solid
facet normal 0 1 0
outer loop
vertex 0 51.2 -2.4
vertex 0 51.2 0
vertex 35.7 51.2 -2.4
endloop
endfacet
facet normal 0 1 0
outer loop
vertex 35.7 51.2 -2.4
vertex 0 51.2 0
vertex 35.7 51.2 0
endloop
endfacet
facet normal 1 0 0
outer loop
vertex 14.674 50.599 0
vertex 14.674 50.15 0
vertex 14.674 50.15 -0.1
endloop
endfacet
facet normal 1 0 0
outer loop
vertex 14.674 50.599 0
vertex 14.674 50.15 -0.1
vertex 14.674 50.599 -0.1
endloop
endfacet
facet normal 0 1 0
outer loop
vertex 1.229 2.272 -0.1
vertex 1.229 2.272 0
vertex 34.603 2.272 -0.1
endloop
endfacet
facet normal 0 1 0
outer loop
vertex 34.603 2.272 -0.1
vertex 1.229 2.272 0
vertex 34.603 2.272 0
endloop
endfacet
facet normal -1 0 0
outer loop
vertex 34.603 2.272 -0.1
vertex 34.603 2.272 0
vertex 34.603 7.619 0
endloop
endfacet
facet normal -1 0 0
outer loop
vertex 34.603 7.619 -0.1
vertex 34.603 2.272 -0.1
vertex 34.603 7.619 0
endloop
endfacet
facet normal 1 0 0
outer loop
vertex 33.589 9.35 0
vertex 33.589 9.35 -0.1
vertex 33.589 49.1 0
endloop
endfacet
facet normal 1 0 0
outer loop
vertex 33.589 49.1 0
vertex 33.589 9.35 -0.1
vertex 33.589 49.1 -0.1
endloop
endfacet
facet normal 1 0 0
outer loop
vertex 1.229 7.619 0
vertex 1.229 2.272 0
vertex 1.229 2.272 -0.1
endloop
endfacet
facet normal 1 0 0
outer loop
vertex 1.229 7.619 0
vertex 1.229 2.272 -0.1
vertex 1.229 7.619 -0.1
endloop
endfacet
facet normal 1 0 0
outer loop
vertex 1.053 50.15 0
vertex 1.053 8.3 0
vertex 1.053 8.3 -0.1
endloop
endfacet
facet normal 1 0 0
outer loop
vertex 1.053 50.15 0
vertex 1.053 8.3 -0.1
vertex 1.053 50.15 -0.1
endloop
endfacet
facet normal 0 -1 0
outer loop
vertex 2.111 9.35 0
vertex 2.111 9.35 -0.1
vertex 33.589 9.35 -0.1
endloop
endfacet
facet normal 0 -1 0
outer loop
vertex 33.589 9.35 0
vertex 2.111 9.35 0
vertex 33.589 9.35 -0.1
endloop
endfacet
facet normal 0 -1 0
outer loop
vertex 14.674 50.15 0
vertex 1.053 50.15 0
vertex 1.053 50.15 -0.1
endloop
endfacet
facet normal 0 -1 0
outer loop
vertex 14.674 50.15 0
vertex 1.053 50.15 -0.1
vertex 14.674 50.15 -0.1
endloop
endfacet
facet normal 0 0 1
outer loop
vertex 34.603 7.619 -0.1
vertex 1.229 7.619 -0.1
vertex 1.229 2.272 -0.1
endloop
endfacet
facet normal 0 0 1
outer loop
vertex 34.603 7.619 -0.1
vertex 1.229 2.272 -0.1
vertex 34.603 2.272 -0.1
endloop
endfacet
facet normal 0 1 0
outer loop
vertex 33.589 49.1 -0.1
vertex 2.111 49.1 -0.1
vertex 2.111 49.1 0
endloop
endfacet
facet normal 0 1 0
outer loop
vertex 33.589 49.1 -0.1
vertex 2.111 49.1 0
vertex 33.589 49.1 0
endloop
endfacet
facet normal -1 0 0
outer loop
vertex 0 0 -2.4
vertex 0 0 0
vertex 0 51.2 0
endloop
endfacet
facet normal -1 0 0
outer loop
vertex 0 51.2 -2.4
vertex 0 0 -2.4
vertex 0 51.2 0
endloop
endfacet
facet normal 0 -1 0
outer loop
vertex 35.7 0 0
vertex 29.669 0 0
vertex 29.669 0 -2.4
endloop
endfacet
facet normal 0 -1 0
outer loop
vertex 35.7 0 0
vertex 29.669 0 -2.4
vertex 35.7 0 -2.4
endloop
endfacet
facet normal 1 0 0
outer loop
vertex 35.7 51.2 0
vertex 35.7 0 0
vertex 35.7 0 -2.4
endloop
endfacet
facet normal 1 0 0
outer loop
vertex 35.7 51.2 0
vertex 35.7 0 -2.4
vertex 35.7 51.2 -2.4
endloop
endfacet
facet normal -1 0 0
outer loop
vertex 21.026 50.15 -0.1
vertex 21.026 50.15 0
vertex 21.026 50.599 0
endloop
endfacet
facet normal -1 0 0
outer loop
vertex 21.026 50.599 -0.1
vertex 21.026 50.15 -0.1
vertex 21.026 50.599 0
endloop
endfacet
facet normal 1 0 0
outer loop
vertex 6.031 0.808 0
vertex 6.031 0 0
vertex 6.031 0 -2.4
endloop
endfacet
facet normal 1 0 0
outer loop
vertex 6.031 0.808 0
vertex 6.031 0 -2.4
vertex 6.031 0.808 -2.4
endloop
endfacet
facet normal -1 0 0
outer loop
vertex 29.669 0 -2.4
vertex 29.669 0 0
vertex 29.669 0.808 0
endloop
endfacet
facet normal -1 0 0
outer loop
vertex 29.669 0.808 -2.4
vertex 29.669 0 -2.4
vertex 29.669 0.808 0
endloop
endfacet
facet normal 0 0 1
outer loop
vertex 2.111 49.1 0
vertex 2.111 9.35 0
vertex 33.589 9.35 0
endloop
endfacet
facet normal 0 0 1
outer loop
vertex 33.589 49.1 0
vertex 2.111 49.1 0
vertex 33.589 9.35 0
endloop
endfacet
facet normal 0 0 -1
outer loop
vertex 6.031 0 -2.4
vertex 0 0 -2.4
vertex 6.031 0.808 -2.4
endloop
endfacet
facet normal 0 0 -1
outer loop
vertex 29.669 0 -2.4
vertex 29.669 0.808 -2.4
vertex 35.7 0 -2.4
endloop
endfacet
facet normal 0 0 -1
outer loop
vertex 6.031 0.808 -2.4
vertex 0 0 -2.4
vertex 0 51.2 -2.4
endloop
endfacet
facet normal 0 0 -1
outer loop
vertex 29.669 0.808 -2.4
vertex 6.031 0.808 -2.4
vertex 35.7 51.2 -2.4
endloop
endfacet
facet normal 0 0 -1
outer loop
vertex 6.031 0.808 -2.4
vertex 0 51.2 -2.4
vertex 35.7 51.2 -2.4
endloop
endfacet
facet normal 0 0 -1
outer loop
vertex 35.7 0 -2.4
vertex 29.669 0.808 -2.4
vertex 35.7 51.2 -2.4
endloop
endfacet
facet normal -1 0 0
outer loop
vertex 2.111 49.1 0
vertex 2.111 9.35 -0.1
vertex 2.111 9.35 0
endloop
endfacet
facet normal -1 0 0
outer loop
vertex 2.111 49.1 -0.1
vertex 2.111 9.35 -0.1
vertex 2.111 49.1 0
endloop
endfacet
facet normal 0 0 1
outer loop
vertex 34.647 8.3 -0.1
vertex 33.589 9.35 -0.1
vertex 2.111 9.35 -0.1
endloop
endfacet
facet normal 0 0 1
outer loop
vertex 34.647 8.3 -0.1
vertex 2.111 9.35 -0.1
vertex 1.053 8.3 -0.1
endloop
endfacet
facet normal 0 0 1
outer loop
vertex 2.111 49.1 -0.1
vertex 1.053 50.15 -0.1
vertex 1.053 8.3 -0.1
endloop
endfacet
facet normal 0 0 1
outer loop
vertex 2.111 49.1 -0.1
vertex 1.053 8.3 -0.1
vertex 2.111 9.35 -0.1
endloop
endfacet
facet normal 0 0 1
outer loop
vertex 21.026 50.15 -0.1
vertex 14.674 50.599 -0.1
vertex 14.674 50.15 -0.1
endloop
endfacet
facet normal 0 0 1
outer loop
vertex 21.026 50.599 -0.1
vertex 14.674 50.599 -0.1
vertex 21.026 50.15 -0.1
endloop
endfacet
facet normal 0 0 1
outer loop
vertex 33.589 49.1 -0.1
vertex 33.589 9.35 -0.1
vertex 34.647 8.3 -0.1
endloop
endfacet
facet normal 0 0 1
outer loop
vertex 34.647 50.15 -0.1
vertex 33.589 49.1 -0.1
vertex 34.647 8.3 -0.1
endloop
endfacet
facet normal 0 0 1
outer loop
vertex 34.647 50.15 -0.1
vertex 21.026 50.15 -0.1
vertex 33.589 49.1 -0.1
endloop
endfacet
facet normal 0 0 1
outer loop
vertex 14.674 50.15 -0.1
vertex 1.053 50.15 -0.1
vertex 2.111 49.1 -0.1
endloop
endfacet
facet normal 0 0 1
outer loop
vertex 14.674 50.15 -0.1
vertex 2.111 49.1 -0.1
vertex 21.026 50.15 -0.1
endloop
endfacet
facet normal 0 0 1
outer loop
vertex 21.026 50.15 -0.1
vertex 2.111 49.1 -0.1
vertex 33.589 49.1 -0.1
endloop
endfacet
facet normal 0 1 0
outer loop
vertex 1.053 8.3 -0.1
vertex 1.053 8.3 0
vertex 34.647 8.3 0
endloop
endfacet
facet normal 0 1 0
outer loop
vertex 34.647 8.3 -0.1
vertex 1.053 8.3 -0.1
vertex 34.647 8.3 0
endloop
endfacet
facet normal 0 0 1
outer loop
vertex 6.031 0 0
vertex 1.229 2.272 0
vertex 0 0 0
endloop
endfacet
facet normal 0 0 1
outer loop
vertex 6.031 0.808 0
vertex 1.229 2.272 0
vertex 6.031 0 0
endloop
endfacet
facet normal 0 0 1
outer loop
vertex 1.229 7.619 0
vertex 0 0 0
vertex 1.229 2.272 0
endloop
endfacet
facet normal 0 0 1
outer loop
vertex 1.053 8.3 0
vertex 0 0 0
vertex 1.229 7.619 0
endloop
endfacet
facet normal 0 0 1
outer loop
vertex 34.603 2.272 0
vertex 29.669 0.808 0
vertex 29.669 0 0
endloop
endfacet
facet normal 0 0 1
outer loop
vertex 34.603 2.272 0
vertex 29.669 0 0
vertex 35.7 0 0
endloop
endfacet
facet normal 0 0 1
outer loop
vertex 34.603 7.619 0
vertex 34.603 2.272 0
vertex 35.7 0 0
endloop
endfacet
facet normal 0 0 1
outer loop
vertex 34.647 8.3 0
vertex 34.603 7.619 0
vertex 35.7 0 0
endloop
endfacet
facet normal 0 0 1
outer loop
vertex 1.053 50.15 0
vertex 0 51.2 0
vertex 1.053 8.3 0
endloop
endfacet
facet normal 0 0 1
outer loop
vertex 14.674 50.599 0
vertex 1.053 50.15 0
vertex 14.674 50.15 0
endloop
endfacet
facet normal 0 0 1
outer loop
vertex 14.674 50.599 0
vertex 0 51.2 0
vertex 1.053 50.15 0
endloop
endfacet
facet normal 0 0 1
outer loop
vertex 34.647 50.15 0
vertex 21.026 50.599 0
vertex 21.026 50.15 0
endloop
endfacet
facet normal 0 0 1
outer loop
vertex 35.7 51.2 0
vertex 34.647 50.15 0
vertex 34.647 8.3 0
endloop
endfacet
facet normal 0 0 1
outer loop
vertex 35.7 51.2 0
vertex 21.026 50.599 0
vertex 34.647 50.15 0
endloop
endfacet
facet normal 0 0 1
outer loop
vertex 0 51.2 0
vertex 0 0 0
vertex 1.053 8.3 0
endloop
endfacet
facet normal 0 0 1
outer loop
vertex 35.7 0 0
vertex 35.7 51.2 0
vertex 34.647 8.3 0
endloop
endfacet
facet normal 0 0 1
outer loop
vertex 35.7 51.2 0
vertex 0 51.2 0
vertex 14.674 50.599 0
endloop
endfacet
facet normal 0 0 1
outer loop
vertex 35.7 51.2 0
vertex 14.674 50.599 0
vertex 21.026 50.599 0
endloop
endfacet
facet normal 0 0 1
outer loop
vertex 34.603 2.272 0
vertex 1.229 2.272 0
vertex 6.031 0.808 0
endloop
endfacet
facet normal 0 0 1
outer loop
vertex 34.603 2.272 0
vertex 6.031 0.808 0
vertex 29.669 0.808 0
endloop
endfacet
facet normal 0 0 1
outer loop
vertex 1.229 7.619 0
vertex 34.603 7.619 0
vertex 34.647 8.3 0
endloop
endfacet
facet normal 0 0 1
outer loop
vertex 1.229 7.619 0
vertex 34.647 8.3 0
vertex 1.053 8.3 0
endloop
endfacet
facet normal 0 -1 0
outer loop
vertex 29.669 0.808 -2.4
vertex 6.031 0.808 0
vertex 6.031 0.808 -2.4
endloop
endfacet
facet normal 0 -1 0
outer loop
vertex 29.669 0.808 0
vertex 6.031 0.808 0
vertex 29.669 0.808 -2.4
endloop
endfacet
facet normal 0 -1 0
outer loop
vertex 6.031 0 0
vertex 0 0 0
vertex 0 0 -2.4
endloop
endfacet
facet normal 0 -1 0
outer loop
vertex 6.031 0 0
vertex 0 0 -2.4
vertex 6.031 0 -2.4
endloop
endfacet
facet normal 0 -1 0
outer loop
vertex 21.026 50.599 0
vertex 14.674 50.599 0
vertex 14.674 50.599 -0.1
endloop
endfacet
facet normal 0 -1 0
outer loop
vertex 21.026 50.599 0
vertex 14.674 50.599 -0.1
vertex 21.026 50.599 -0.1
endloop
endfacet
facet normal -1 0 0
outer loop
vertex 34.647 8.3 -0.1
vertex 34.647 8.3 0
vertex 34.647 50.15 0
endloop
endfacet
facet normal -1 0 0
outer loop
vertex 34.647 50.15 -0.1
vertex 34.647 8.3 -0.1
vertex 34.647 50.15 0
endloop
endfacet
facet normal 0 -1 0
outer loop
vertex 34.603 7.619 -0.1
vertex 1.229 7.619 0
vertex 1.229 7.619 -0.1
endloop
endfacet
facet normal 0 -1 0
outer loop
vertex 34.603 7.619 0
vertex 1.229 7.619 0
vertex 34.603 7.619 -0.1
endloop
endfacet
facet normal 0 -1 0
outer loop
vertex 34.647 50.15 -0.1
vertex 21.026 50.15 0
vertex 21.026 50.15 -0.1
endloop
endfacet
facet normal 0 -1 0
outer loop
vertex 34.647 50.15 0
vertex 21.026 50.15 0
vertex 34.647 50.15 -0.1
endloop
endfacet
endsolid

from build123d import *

# Parameters (mm, degrees)
ESQUISSE6_W             = 35.7
ESQUISSE6_H             = 51.2
BOSS_EXTRU_3_DEPTH      = 2.4
ESQUISSE7_W             = 33.59337029
ESQUISSE7_H             = 41.85
ENL_V_MAT_EXTRU_4_DEPTH = 0.1
ESQUISSE8_W             = 6.352818378
ESQUISSE8_H             = 0.449413723
ENL_V_MAT_EXTRU_5_DEPTH = 0.1
ESQUISSE9_W             = 31.478034176
ESQUISSE9_H             = 39.75
BOSS_EXTRU_4_DEPTH      = 0.1
ESQUISSE10_W            = 33.373849312
ESQUISSE10_H            = 5.346626879
ENL_V_MAT_EXTRU_6_DEPTH = 0.1
ESQUISSE11_W            = 23.638967436
ESQUISSE11_H            = 0.807997654
ENL_V_MAT_EXTRU_7_DEPTH = 63.463509347


with BuildPart() as part:
    # Esquisse6 → Boss.-Extru.3 (new body)
    with BuildSketch(Plane.XY):
        with Locations((17.85, 25.6)):
            Rectangle(ESQUISSE6_W, ESQUISSE6_H)
    extrude(amount=-BOSS_EXTRU_3_DEPTH)

    # Esquisse7 → Enlèv. mat.-Extru.4 (cut)
    with BuildSketch(Plane.XY):
        with Locations((17.85, 29.225)):
            Rectangle(ESQUISSE7_W, ESQUISSE7_H)
    extrude(amount=-ENL_V_MAT_EXTRU_4_DEPTH, mode=Mode.SUBTRACT)

    # Esquisse8 → Enlèv. mat.-Extru.5 (cut)
    with BuildSketch(Plane.XY):
        with Locations((17.85, 50.374706862)):
            Rectangle(ESQUISSE8_W, ESQUISSE8_H)
    extrude(amount=-ENL_V_MAT_EXTRU_5_DEPTH, mode=Mode.SUBTRACT)

    # Esquisse9 → Boss.-Extru.4 (add)
    with BuildSketch(Plane.XY.offset(-0.1)):
        with Locations((17.85, 29.225)):
            Rectangle(ESQUISSE9_W, ESQUISSE9_H)
    extrude(amount=BOSS_EXTRU_4_DEPTH)

    # Esquisse10 → Enlèv. mat.-Extru.6 (cut)
    with BuildSketch(Plane.XY):
        with Locations((17.915693231, 4.94567387)):
            Rectangle(ESQUISSE10_W, ESQUISSE10_H)
    extrude(amount=-ENL_V_MAT_EXTRU_6_DEPTH, mode=Mode.SUBTRACT)

    # Esquisse11 → Enlèv. mat.-Extru.7 (cut, through all)
    with BuildSketch(Plane.XY):
        with Locations((17.85, 0.403998827)):
            Rectangle(ESQUISSE11_W, ESQUISSE11_H)
    extrude(amount=-ENL_V_MAT_EXTRU_7_DEPTH, mode=Mode.SUBTRACT)


solid = part.part
